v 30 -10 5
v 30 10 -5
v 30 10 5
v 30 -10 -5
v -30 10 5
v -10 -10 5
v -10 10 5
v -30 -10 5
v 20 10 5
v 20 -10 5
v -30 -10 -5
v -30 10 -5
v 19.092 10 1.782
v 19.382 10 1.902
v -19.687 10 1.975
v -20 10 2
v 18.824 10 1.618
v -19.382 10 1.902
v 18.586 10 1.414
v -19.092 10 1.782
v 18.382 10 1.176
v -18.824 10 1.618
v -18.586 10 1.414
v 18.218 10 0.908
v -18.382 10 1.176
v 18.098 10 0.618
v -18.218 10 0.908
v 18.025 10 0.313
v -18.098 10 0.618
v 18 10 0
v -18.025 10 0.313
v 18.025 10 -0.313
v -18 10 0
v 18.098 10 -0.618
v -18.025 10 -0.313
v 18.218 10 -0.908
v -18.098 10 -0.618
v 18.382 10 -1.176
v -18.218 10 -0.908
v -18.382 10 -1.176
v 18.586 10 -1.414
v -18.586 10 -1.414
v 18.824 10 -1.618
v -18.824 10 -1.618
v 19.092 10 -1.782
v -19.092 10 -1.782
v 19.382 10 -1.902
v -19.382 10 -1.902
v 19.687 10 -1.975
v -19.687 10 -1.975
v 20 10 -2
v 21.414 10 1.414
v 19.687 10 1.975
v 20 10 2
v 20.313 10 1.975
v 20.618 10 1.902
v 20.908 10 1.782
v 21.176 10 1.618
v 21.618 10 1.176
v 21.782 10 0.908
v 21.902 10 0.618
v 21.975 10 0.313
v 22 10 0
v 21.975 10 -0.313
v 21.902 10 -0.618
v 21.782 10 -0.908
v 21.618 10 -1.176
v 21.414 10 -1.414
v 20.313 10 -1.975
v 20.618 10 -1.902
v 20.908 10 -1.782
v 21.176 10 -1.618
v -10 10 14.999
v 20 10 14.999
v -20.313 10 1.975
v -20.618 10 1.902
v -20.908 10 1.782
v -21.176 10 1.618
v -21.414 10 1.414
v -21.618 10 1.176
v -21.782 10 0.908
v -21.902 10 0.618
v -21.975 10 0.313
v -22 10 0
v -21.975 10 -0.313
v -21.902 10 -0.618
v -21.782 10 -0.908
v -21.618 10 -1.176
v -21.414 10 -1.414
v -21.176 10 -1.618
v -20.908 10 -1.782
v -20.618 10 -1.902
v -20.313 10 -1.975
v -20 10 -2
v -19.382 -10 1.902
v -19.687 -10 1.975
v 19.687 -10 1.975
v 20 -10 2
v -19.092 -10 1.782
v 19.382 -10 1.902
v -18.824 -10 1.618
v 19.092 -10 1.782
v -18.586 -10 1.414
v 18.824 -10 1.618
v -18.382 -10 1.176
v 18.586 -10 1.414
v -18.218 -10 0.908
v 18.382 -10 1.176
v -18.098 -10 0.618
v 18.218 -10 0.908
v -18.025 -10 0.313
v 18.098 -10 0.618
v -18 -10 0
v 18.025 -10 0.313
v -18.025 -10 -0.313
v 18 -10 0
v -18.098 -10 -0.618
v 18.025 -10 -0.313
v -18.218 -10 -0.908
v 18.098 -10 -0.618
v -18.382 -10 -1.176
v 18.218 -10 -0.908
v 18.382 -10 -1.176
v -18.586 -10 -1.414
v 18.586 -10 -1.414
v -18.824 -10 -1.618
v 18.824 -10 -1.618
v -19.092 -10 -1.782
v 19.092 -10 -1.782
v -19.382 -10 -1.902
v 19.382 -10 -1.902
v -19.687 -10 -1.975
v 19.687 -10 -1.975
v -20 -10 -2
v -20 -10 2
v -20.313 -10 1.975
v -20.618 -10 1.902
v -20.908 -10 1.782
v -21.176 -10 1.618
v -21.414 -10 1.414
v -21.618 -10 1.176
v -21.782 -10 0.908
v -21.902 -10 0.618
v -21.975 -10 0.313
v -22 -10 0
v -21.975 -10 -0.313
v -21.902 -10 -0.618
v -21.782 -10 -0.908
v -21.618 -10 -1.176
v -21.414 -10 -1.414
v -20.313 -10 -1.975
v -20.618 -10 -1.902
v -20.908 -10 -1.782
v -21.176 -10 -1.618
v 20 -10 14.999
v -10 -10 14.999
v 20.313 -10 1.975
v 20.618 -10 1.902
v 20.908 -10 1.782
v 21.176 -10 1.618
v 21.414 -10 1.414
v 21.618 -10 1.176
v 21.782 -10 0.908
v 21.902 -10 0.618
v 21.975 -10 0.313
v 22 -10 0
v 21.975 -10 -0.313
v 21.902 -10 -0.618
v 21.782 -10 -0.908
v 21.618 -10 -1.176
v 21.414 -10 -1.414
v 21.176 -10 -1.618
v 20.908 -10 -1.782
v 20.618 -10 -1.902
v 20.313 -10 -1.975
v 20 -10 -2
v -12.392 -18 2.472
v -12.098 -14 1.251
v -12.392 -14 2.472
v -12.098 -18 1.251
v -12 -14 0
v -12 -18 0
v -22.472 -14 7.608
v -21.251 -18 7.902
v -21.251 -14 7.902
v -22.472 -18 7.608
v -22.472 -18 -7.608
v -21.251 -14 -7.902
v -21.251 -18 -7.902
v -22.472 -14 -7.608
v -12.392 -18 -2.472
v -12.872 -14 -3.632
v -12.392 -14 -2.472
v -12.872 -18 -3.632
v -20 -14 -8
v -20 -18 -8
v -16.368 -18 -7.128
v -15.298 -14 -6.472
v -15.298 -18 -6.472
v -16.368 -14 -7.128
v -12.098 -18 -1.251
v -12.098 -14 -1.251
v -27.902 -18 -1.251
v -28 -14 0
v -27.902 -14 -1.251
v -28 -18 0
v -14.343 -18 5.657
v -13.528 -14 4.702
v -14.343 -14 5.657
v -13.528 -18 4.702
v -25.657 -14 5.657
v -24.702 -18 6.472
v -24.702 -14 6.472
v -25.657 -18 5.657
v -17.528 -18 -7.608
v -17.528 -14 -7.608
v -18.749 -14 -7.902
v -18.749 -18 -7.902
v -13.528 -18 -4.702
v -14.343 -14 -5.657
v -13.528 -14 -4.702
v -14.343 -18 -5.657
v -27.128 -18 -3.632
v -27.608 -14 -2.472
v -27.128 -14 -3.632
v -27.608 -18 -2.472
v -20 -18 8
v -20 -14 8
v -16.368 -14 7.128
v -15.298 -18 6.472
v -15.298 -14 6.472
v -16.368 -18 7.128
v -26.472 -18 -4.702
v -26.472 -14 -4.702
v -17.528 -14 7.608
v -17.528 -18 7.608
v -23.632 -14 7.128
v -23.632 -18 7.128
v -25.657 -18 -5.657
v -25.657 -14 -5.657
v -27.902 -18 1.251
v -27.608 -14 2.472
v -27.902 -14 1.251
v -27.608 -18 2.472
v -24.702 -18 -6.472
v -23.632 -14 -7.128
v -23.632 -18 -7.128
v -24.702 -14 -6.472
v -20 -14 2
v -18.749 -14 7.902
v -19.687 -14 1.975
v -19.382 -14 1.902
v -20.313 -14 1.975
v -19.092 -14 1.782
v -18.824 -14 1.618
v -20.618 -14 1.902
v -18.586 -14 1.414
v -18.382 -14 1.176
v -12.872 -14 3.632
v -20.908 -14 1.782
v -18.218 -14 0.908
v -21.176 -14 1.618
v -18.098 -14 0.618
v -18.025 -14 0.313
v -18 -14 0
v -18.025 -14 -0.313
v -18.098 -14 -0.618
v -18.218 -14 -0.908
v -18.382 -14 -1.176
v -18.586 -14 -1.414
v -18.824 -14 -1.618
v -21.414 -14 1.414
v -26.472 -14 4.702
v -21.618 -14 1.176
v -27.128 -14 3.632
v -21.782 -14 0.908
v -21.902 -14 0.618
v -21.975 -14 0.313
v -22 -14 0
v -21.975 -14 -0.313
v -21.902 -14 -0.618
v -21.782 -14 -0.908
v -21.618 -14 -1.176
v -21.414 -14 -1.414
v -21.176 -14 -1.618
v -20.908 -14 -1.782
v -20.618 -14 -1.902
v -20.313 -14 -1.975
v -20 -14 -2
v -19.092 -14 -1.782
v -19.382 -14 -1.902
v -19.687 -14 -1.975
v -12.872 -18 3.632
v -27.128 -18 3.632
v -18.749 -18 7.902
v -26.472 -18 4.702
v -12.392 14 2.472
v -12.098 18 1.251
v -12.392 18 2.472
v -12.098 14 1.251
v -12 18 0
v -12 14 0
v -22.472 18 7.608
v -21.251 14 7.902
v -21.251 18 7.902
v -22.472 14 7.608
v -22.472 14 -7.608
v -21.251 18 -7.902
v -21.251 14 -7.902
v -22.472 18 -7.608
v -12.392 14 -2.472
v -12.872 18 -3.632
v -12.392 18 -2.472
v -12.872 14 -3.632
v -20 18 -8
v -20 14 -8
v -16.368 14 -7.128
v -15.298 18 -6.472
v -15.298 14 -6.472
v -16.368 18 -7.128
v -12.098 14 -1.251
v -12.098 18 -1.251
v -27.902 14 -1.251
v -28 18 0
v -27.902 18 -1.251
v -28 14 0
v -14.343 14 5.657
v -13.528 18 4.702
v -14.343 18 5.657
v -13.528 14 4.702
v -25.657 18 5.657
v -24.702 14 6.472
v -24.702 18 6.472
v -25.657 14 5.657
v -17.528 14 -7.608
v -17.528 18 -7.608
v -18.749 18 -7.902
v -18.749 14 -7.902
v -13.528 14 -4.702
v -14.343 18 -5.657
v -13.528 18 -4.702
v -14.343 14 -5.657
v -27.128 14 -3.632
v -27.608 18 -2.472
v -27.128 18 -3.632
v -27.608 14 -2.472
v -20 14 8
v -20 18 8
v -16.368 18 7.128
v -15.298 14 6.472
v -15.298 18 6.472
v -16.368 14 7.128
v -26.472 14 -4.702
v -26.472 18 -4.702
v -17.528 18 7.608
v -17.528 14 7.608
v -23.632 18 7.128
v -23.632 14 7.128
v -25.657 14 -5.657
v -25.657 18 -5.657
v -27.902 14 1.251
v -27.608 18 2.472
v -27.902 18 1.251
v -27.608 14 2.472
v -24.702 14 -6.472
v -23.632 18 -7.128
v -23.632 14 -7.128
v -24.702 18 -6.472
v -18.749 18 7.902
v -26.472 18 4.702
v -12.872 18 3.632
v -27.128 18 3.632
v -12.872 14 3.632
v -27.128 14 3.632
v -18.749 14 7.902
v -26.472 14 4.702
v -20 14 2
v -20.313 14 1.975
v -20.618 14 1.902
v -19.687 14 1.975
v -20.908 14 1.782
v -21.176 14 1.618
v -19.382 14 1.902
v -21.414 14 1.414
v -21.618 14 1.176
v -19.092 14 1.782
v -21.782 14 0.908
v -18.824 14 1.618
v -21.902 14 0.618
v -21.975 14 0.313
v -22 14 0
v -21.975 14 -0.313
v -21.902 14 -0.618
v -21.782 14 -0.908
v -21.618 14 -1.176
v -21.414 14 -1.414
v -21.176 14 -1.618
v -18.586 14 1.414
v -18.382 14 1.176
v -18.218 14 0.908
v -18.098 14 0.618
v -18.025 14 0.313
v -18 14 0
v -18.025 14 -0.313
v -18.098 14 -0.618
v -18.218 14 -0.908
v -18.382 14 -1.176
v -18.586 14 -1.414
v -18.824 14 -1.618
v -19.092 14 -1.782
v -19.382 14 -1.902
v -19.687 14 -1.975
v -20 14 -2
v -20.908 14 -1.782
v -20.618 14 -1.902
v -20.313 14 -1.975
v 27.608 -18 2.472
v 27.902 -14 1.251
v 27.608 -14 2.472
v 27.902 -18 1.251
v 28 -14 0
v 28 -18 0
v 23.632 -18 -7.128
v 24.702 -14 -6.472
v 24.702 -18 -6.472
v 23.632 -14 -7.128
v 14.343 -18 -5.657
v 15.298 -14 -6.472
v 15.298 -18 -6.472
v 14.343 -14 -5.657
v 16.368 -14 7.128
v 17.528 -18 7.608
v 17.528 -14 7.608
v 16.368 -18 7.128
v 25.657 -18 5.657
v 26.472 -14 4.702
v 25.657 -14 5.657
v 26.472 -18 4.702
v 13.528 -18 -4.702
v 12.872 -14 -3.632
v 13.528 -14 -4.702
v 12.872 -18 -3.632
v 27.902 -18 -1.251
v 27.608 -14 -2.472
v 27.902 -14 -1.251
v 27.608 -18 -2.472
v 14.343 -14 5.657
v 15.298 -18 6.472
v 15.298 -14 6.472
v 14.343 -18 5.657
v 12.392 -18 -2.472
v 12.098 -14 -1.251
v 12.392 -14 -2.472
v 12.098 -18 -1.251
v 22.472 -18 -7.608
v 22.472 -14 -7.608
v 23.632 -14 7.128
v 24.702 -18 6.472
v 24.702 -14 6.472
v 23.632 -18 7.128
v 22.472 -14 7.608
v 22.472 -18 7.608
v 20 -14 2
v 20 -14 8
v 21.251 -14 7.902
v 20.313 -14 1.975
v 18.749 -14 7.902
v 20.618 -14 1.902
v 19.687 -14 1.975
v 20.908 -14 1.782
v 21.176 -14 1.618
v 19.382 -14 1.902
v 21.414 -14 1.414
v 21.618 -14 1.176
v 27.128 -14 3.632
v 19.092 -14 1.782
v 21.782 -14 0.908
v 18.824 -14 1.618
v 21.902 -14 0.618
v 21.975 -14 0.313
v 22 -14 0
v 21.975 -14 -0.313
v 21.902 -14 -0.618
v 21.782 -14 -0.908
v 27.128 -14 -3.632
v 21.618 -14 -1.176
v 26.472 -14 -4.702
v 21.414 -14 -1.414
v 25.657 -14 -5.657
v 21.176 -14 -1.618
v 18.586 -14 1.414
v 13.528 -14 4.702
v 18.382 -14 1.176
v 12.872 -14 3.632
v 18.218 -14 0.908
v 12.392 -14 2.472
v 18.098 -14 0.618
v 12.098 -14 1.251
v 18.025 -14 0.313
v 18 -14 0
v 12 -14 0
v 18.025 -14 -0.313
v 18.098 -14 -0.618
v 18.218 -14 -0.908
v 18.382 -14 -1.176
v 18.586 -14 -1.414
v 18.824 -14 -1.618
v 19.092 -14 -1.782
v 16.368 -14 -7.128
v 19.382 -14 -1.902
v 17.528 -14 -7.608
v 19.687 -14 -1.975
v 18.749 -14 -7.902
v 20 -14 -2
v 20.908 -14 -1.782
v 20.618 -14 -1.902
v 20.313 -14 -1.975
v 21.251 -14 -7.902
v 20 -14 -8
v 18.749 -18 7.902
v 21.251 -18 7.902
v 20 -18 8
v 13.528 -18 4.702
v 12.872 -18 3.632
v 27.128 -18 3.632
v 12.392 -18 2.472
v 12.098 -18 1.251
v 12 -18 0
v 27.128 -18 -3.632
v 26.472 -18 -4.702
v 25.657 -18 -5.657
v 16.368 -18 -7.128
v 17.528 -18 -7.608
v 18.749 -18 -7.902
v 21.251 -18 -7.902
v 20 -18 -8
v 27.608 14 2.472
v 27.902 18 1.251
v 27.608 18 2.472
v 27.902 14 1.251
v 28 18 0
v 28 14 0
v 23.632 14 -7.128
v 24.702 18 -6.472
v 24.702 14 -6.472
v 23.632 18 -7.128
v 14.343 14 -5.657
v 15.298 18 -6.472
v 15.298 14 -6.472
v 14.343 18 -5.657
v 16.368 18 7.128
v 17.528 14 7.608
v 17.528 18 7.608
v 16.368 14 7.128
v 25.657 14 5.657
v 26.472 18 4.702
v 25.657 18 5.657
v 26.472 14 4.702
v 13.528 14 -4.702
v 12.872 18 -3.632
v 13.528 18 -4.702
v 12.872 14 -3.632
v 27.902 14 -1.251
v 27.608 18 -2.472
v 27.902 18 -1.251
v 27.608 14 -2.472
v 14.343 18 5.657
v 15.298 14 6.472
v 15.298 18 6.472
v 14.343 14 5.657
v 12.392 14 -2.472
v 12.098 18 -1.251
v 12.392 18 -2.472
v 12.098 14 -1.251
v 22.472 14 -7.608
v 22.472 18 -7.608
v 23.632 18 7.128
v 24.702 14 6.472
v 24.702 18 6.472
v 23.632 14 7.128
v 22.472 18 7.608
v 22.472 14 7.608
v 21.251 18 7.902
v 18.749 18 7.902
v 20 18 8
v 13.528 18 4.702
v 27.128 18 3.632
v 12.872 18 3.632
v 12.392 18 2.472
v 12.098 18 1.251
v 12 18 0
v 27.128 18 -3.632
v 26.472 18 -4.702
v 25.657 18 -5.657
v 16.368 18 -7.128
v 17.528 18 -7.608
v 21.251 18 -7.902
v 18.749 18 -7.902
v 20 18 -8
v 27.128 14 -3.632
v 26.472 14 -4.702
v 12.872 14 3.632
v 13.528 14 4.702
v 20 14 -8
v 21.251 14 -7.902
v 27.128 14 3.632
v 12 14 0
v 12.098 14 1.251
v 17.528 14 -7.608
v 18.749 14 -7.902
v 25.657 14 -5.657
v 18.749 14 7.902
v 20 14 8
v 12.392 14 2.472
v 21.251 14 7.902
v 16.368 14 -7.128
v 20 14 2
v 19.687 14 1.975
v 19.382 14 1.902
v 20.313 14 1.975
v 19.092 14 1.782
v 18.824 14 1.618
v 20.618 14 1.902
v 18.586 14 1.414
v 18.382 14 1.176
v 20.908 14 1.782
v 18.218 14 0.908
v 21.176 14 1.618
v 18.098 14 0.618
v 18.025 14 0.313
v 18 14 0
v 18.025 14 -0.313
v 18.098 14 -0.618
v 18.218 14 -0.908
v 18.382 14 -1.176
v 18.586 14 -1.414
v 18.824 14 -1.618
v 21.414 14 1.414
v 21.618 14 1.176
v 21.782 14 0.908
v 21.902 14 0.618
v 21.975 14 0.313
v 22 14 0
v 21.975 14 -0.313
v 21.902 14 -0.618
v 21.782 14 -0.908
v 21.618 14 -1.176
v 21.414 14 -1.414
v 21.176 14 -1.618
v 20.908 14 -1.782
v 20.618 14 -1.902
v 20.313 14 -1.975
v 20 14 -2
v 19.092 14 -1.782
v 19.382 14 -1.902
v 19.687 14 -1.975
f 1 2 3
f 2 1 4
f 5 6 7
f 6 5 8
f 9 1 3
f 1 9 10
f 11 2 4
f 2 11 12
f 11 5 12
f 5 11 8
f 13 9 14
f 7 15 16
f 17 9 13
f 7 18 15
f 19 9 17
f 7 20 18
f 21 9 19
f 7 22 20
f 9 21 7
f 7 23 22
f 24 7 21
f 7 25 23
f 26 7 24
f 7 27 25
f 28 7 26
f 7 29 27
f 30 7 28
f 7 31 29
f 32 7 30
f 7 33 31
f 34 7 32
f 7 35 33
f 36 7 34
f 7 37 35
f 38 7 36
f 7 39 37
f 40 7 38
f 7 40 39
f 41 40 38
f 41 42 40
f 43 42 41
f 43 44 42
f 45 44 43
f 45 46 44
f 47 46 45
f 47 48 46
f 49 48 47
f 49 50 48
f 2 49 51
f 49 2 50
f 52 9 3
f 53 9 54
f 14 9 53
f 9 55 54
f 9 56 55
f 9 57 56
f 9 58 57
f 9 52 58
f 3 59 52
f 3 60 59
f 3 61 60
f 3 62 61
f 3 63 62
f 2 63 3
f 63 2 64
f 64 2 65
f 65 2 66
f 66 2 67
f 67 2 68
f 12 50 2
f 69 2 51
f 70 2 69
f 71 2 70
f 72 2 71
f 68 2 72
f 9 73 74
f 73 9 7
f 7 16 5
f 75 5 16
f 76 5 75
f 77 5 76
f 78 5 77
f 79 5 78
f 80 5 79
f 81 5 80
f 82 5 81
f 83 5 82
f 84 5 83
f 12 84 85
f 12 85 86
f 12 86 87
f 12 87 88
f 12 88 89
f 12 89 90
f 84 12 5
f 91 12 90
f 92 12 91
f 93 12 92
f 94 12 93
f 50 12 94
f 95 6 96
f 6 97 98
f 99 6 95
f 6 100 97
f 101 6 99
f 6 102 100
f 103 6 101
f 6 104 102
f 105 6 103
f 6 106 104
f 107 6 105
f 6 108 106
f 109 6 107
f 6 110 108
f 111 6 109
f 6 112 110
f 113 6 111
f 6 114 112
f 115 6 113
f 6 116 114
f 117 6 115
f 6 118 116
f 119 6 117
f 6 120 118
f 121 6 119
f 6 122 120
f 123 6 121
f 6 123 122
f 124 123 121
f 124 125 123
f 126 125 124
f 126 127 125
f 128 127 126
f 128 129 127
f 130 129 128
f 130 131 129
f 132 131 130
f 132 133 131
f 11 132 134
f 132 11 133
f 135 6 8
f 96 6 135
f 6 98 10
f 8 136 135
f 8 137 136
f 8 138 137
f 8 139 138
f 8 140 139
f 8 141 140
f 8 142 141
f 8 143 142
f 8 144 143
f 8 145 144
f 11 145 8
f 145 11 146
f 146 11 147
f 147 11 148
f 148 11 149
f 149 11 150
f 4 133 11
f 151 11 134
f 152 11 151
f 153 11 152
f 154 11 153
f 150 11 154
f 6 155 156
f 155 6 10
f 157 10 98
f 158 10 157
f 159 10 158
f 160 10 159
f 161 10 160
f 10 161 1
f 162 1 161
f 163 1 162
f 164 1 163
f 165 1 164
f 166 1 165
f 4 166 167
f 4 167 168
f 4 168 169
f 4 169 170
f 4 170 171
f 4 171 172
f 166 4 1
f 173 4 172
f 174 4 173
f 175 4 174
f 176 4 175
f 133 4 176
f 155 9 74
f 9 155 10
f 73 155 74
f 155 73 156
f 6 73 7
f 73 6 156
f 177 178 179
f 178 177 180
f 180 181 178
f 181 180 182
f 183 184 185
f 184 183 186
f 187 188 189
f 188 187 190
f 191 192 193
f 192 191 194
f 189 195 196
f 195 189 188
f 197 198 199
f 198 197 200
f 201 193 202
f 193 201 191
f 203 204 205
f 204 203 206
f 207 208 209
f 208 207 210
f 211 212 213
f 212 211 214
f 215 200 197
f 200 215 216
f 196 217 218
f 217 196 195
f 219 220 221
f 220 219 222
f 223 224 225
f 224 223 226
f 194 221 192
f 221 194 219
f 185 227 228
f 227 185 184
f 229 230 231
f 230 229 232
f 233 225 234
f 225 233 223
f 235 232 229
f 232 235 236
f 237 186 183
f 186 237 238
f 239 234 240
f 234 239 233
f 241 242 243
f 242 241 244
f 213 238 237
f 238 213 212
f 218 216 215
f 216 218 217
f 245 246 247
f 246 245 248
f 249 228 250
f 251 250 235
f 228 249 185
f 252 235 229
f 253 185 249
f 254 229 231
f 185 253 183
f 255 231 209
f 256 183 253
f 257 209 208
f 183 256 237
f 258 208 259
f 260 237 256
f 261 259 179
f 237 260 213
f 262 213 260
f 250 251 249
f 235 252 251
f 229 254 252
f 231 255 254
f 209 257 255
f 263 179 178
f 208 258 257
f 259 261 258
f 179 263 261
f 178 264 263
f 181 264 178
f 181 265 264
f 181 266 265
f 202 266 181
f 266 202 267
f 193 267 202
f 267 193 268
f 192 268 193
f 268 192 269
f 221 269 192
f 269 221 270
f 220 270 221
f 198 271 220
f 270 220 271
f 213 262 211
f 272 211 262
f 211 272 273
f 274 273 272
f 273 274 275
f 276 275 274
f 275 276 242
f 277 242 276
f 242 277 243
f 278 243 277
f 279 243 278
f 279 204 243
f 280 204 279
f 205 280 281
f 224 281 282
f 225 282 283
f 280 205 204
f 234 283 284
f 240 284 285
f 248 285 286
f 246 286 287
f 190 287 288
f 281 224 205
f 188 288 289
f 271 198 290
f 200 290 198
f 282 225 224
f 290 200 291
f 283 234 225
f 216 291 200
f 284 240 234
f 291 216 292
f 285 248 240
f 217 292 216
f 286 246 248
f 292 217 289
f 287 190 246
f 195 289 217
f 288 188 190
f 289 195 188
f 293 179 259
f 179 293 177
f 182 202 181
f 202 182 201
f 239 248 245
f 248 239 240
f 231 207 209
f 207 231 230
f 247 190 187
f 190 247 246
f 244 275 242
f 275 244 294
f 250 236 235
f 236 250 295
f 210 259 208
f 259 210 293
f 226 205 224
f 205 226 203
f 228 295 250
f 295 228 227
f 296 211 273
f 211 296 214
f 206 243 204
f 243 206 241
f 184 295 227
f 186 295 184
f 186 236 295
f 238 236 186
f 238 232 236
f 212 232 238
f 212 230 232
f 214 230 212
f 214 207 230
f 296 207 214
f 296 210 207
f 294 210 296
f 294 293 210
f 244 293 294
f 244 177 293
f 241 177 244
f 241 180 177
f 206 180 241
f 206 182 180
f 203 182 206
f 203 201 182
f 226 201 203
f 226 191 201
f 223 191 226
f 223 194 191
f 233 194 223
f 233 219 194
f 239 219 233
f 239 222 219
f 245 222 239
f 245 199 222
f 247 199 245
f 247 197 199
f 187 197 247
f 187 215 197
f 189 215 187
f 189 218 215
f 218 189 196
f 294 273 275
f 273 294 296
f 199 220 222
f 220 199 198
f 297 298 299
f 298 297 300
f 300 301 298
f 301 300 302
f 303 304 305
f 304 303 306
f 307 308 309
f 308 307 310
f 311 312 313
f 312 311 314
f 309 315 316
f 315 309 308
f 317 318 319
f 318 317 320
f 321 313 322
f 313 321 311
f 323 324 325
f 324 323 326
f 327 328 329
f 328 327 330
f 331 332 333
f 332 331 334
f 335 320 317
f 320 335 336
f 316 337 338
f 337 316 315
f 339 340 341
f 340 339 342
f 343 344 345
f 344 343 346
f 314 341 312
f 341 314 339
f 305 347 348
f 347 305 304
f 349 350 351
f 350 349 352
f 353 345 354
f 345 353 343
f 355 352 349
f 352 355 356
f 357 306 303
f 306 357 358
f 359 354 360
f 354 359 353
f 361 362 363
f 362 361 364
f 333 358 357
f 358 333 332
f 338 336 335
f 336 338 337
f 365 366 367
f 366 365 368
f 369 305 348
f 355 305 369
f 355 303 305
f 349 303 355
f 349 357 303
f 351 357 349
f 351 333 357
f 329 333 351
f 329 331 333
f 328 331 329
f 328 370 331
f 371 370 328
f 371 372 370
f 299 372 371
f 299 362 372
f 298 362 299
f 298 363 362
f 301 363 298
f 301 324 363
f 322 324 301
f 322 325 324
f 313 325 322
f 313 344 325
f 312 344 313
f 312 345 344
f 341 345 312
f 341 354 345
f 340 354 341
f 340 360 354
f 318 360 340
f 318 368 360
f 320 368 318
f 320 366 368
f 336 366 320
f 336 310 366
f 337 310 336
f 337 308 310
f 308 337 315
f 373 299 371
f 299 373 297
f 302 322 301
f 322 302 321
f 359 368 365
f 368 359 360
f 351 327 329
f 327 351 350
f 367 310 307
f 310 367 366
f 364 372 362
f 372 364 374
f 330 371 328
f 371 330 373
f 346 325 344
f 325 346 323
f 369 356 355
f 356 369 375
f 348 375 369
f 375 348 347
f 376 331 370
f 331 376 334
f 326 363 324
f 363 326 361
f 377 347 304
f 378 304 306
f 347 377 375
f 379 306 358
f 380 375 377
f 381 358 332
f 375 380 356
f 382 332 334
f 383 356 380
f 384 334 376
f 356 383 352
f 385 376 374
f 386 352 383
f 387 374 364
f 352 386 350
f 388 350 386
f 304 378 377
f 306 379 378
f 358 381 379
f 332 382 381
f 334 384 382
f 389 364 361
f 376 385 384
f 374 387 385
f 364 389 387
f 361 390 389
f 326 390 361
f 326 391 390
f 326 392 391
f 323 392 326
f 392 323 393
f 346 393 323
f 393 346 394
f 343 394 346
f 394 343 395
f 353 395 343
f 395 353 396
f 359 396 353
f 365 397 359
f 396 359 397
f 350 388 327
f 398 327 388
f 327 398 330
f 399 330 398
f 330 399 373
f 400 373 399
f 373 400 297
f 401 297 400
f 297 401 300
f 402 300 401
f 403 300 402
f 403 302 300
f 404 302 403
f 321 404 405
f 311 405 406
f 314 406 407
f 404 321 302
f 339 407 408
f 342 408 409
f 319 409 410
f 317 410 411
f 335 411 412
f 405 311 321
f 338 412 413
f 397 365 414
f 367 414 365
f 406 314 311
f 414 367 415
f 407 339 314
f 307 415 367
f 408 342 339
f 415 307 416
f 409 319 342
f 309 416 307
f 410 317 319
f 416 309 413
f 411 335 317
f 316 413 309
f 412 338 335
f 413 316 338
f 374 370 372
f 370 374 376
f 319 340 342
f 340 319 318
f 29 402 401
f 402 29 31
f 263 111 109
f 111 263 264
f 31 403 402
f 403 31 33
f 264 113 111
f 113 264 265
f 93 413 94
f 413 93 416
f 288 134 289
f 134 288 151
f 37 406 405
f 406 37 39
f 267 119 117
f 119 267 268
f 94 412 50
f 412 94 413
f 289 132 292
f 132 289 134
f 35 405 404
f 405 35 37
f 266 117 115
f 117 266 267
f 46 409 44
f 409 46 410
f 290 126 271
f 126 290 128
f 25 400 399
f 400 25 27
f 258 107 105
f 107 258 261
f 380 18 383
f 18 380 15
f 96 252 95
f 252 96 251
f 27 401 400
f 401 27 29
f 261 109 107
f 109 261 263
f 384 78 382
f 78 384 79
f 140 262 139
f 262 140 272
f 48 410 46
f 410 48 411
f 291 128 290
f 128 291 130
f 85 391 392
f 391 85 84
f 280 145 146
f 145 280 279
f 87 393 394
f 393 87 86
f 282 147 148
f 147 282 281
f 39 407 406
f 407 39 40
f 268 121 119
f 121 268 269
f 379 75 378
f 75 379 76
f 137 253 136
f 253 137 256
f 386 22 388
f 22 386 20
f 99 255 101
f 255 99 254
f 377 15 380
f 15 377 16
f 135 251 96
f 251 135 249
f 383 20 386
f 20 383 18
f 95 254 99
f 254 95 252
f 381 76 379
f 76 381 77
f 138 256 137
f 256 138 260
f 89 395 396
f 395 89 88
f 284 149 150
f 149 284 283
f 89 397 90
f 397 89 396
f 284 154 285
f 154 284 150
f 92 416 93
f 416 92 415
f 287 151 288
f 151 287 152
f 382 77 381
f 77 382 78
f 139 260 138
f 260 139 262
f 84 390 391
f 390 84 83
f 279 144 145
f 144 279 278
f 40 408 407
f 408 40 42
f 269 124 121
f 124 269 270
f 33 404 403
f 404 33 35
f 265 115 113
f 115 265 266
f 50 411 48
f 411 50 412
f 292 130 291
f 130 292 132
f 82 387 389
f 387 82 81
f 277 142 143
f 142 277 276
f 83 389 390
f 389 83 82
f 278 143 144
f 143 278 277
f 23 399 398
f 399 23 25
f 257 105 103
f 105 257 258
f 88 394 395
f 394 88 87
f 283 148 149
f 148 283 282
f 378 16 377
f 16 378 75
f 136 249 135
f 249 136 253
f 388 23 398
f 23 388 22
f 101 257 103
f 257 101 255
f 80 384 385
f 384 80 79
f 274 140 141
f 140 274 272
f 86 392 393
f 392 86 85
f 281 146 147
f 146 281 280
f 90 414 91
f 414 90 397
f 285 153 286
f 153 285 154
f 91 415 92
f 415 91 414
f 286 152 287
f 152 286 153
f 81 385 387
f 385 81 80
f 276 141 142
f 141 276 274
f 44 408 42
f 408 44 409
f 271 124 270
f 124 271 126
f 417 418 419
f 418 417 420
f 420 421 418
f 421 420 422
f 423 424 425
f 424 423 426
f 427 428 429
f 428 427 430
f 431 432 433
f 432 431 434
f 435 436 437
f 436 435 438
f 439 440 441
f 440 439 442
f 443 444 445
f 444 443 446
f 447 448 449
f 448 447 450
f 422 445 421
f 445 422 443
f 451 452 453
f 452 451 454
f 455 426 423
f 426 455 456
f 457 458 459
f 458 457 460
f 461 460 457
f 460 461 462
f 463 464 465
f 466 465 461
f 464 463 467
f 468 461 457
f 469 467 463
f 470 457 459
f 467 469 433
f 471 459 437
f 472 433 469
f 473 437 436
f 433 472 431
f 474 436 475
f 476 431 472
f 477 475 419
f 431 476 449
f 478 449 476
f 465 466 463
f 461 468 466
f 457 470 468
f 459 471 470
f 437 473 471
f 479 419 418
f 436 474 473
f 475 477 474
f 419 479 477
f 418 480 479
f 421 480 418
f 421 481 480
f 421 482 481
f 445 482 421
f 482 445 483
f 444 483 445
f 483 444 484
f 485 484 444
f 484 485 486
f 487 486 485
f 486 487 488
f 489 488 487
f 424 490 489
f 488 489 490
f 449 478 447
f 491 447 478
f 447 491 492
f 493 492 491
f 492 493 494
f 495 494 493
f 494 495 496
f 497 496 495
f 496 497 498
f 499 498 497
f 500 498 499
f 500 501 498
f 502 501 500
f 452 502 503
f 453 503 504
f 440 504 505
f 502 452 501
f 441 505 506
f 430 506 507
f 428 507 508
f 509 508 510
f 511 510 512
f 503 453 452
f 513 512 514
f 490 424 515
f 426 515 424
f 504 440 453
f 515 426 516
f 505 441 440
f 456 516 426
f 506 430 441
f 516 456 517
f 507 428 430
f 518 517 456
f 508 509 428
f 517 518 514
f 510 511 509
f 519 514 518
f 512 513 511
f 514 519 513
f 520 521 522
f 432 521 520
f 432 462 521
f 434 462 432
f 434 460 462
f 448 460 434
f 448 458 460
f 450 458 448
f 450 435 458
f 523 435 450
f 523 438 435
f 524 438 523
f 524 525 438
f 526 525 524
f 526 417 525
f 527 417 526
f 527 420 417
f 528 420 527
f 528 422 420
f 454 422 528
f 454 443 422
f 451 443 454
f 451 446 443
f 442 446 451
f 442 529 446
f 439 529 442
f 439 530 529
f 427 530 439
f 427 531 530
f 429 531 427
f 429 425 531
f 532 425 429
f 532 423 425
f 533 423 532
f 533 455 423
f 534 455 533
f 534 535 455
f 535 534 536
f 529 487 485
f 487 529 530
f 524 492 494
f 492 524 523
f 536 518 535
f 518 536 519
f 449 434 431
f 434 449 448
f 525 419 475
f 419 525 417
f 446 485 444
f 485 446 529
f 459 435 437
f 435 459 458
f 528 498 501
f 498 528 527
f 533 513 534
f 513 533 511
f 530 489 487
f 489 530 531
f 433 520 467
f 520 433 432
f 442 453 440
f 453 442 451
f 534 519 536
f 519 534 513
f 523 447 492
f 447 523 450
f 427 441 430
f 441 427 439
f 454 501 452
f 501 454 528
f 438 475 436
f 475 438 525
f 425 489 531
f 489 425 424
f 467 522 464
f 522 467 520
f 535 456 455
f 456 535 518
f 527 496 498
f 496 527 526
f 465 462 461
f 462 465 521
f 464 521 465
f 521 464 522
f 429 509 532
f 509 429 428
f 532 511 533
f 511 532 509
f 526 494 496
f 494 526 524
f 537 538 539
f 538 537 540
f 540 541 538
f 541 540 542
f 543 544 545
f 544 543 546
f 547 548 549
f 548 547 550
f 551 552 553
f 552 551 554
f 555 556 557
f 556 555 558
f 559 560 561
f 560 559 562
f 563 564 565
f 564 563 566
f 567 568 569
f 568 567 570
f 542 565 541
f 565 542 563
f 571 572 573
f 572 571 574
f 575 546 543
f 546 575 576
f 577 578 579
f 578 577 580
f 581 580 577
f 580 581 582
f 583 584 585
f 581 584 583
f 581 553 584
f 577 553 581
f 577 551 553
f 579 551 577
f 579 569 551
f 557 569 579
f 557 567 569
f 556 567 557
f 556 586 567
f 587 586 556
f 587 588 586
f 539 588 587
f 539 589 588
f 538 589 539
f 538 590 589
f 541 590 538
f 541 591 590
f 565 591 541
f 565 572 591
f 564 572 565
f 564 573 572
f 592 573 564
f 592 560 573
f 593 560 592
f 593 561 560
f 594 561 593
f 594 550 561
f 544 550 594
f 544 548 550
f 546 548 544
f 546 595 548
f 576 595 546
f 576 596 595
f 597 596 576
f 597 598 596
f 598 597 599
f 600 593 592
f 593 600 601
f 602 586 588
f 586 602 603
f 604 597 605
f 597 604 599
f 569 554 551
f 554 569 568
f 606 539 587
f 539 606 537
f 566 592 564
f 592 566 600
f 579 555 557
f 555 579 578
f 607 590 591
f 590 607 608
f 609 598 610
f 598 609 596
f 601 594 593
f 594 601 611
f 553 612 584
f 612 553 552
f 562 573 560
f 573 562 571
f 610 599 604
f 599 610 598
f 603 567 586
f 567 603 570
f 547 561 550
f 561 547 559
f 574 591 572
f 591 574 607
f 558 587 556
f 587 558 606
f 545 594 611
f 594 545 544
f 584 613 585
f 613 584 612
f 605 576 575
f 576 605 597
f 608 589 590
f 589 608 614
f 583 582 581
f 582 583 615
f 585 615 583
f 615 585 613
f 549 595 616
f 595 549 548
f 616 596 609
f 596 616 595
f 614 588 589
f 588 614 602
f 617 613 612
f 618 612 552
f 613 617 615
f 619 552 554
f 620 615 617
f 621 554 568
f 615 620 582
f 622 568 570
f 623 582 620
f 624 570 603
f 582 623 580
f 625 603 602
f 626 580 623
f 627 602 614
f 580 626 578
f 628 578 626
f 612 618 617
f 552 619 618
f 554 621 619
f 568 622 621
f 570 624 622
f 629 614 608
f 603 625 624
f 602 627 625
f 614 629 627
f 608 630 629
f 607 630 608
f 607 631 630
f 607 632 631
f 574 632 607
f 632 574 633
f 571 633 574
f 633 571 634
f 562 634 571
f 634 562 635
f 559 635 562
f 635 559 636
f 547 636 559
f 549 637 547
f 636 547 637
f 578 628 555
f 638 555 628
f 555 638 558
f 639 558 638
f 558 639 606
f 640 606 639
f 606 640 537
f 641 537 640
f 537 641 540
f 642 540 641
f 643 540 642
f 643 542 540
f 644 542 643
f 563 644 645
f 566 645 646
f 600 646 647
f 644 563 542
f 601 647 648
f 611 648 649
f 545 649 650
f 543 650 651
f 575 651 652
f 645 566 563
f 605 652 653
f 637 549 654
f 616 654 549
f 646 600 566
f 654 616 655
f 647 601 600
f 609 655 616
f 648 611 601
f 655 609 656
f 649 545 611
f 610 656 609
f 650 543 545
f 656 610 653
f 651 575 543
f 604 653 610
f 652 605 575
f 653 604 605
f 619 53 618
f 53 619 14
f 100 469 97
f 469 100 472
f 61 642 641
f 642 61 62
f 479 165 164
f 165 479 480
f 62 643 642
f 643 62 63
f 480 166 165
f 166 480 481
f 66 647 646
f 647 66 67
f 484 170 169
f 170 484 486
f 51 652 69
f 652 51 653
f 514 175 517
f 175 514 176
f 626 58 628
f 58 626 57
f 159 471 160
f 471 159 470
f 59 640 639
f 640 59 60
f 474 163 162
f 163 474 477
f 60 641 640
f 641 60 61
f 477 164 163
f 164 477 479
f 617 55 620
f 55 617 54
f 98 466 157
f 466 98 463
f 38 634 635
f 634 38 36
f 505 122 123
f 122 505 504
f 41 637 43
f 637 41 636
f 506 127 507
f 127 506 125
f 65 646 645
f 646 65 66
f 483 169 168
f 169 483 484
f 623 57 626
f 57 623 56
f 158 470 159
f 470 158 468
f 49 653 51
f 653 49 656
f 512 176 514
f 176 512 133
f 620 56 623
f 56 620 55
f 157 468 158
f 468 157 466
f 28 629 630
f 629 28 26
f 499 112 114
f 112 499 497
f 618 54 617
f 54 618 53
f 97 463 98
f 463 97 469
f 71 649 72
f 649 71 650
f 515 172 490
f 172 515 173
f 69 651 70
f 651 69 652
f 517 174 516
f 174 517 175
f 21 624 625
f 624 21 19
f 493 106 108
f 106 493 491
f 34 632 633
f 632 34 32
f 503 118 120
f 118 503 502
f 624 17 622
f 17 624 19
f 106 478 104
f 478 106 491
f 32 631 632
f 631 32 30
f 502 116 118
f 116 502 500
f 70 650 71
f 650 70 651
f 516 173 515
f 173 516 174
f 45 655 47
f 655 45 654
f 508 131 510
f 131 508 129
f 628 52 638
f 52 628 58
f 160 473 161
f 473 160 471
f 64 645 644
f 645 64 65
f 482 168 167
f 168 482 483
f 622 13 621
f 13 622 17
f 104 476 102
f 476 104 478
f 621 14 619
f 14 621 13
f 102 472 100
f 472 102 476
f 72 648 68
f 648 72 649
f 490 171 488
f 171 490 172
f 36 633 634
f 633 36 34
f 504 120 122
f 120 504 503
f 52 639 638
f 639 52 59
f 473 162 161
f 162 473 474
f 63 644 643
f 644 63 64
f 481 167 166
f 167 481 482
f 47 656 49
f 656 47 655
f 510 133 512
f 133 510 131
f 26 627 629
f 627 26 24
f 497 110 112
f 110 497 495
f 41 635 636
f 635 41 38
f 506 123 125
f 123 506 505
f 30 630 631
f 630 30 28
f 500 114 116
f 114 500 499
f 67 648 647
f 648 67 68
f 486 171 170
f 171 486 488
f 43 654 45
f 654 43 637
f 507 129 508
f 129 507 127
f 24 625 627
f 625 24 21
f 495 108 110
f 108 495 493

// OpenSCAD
// 3DScad tutorial example: simple car
// Adapted from the OpenSCAD User Manual, Chapter 5
// https://github.com/openscad/documentation (public domain)
// Uses only the currently round-trippable subset.

$fn = 40;

// Parameters — global so module thumbnails resolve correctly.
wheel_r = 8;
wheel_w = 4;
axle_r  = 2;

// A single wheel: a flat cylinder rotated so it faces along Y.
module wheel(r = wheel_r, w = wheel_w) {
    rotate([90, 0, 0]) {
        cylinder(h=w, r=r, center=true);
    }
}

// A thin axle rod spanning the track width.
module axle(len = 32) {
    rotate([90, 0, 0]) {
        cylinder(h=len, r=axle_r, center=true);
    }
}

module scene_model() {
    body_l   = 60;
    body_w   = 20;
    base_h   = 10;
    top_h    = 10;
    top_l    = 30;
    top_dx   = 5;
    track    = 32;
    front_x  = -20;
    rear_x   = 20;
    half_t   = track / 2;

    // Body base
    cube([body_l, body_w, base_h], center=true);
    // Cabin on top
    translate([top_dx, 0, base_h / 2 + top_h / 2 - 0.001]) {
        cube([top_l, body_w, top_h], center=true);
    }

    // Front left wheel
    translate([front_x, -half_t, 0]) {
        wheel();
    }
    // Front right wheel
    translate([front_x, half_t, 0]) {
        wheel();
    }
    // Front axle
    translate([front_x, 0, 0]) {
        axle(len=track);
    }

    // Rear left wheel
    translate([rear_x, -half_t, 0]) {
        wheel();
    }
    // Rear right wheel
    translate([rear_x, half_t, 0]) {
        wheel();
    }
    // Rear axle
    translate([rear_x, 0, 0]) {
        axle(len=track);
    }
}

scene_model();
